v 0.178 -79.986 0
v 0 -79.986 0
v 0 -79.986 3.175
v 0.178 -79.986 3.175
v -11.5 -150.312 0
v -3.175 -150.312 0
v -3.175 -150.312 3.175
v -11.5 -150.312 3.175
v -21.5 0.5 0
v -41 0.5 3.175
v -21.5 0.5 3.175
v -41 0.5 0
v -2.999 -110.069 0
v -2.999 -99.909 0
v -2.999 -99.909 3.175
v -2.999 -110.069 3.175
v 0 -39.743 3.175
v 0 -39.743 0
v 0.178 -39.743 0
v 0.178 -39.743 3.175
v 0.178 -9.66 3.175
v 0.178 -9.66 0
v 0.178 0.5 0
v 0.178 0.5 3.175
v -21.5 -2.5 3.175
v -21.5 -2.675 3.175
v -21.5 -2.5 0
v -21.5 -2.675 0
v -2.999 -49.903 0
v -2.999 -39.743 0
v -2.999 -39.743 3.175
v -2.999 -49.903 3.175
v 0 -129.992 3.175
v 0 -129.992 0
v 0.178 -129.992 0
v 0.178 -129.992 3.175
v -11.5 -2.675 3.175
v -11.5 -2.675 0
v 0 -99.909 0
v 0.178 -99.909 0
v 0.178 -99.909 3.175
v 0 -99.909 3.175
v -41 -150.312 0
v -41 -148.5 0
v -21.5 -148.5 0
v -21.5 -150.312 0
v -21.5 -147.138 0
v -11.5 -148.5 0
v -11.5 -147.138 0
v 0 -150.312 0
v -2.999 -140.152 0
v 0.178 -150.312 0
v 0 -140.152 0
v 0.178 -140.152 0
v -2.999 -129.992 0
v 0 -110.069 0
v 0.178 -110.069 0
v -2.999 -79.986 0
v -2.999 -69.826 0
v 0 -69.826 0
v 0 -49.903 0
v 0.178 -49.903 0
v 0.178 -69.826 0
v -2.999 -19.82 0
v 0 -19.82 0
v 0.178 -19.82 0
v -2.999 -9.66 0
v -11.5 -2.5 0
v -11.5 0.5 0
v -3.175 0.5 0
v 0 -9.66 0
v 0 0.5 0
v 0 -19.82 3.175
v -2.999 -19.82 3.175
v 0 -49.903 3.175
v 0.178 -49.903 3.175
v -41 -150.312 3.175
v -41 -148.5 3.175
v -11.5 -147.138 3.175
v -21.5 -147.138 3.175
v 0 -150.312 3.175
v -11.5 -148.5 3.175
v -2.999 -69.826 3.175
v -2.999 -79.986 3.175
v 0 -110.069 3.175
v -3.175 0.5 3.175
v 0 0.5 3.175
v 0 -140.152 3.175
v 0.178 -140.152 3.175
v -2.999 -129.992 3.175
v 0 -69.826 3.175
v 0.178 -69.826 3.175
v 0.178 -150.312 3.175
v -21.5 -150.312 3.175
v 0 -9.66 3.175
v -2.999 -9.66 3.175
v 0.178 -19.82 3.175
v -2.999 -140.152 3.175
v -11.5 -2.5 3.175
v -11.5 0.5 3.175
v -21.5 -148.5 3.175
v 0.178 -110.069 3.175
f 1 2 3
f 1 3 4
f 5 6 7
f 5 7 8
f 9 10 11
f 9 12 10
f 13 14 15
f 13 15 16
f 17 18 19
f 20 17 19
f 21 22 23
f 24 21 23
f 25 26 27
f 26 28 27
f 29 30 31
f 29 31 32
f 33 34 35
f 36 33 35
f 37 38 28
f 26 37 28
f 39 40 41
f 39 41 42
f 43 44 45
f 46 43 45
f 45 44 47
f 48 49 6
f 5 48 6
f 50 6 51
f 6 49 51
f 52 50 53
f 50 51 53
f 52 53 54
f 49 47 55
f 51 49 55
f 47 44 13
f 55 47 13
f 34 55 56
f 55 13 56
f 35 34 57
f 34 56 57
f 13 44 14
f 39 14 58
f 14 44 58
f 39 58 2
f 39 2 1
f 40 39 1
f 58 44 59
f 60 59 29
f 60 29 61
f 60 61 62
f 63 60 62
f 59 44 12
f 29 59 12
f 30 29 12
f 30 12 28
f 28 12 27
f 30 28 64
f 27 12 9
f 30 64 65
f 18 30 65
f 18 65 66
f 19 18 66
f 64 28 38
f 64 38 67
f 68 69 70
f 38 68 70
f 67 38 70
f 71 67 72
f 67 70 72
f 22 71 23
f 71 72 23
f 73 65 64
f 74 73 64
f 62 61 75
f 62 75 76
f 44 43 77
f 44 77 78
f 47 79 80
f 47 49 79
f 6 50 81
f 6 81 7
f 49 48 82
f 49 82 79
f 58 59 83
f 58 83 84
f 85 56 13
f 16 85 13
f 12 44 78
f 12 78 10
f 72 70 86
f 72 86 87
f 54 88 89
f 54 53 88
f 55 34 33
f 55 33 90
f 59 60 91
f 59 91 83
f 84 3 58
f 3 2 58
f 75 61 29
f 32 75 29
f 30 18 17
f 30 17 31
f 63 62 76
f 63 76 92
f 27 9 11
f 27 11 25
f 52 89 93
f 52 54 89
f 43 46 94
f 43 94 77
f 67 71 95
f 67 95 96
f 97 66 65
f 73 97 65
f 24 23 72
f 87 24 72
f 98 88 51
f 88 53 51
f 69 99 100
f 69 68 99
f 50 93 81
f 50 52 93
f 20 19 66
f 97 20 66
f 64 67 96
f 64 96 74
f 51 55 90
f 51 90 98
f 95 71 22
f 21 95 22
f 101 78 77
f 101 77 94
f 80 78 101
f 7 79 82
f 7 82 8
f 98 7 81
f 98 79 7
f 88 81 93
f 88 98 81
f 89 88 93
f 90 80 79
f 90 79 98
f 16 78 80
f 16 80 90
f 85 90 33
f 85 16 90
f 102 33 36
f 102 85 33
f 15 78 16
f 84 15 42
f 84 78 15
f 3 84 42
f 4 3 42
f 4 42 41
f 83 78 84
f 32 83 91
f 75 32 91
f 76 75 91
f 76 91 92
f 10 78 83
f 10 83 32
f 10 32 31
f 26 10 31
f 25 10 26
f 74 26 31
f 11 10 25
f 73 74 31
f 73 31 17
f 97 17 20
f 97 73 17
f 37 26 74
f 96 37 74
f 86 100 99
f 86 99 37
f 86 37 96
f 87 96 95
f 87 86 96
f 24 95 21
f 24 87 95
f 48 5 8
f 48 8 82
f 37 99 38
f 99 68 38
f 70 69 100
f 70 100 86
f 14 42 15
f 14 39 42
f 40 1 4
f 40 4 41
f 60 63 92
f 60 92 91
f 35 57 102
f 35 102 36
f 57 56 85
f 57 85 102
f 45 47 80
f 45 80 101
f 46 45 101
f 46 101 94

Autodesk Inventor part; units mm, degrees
ref_plane "YZ Plane" through (0, 0, 0) normal (1, 0, 0) x (0, 1, 0)
ref_plane "XZ Plane" through (0, 0, 0) normal (0, 1, 0) x (-1, 0, 0)
ref_plane "XY Plane" through (0, 0, 0) normal (0, 0, 1) x (1, 0, 0)
sketch "Sketch1" plane through (0, 0, 0) normal (0, 0, 1) x (1, 0, 0)
  line L0 (-11.5, -148.5) -> (-11.5, -147.1375)
  line L1 (-21.5, -147.1375) -> (-21.5, -148.5)
  line L2 (-41, -148.5) -> (-41, 0.5)
  line L3 (-41, 0.5) -> (-21.5, 0.5)
  line L4 (-21.5, 0.5) -> (-21.5, -2.5)
  line L5 (-11.5, -2.5) -> (-11.5, 0.5)
  line L6 (-11.5, 0.5) -> (0, 0.5)
  line L7 (-11.5, -148.5) -> (-11.5, -147.1375)
  line L8 (-21.5, -147.1375) -> (-21.5, -148.5)
  line L9 (-41, -148.5) -> (-41, 0.5)
  line L10 (-41, 0.5) -> (-21.5, 0.5)
  line L11 (-21.5, 0.5) -> (-21.5, -2.5)
  line L12 (-11.5, -2.5) -> (-11.5, 0.5)
  line L13 (-11.5, 0.5) -> (0, 0.5)
  line L14 (-41, -150.3125) -> (-41, 0.5)
  line L15 (-11.5, -150.3125) -> (-11.5, -147.1375)
  line L16 (-11.5, -147.1375) -> (-21.5, -147.1375)
  line L17 (-21.5, -147.1375) -> (-21.5, -150.3125)
  line L18 (0, -150.3125) -> (-11.5, -150.3125)
  line L19 (-21.5, -150.3125) -> (-41, -150.3125)
  line L20 (-11.5, 0.5) -> (-11.5, -2.675)
  line L21 (-11.5, -2.675) -> (-21.5, -2.675)
  line L22 (-21.5, -2.675) -> (-21.5, 0.5)
  line L23 (0, 0.5) -> (-3.175, 0.5)
  line L24 (-3.175, -150.3125) -> (0, -150.3125)
  line L25 (-3.175, 0.5) -> (0, 0.5)
  line L26 (0, -9.66) -> (-2.9986, -9.66)
  line L27 (-2.9986, -9.66) -> (0, -9.66)
  line L28 (0, -19.82) -> (-2.9986, -19.82)
  line L29 (-2.9986, -19.82) -> (0, -19.82)
  line L30 (0, -39.7431) -> (-2.9986, -39.7431)
  line L31 (-2.9986, -39.7431) -> (0, -39.7431)
  line L32 (0, -49.9031) -> (-2.9986, -49.9031)
  line L33 (-2.9986, -49.9031) -> (0, -49.9031)
  line L34 (0, -69.8263) -> (-2.9986, -69.8263)
  line L35 (-2.9986, -69.8263) -> (0, -69.8263)
  line L36 (0, -79.9863) -> (-2.9986, -79.9863)
  line L37 (-2.9986, -79.9863) -> (0, -79.9863)
  line L38 (0, -99.9094) -> (-2.9986, -99.9094)
  line L39 (-2.9986, -99.9094) -> (0, -99.9094)
  line L40 (0, -110.0694) -> (-2.9986, -110.0694)
  line L41 (-2.9986, -110.0694) -> (0, -110.0694)
  line L42 (0, -129.9925) -> (-2.9986, -129.9925)
  line L43 (-2.9986, -129.9925) -> (0, -129.9925)
  line L44 (0, -140.1525) -> (-2.9986, -140.1525)
  line L45 (-2.9986, -140.1525) -> (0, -140.1525)
  line L46 (0, -150.3125) -> (-3.175, -150.3125)
  line L47 (-41, 0.5) -> (-21.5, 0.5)
  line L48 (-11.5, 0.5) -> (0, 0.5)
  line L49 (-2.9986, -9.66) -> (-2.9986, -19.82)
  line L50 (-2.9986, -39.7431) -> (-2.9986, -49.9031)
  line L51 (0, -49.9031) -> (0.1778, -49.9031)
  line L52 (0.1778, -49.9031) -> (0.1778, -69.8263)
  line L53 (0.1778, -69.8263) -> (0, -69.8263)
  line L54 (-2.9986, -69.8263) -> (-2.9986, -79.9863)
  line L55 (0, -79.9863) -> (0.1778, -79.9863)
  line L56 (0.1778, -79.9863) -> (0.1778, -99.9094)
  line L57 (0.1778, -99.9094) -> (0, -99.9094)
  line L58 (-2.9986, -99.9094) -> (-2.9986, -110.0694)
  line L59 (-2.9986, -129.9925) -> (-2.9986, -140.1525)
  line L60 (0.1778, -150.3125) -> (0, -150.3125)
  line L61 (0, -140.1525) -> (0.1778, -140.1525)
  line L62 (0, -129.9925) -> (0.1778, -129.9925)
  line L63 (0, -110.0694) -> (0.1778, -110.0694)
  line L64 (0.1778, -110.0694) -> (0.1778, -129.9925)
  line L65 (0.1778, -140.1525) -> (0.1778, -150.3125)
  line L66 (0, -39.7431) -> (0.1778, -39.7431)
  line L67 (0.1778, -39.7431) -> (0.1778, -19.82)
  line L68 (0.1778, -19.82) -> (0, -19.82)
  line L69 (0, -9.66) -> (0.1778, -9.66)
  line L70 (0.1778, -9.66) -> (0.1778, 0.5)
  line L71 (0.1778, 0.5) -> (0, 0.5)
  point P0 (0, 0)
  dimension "d2" = 3.175
  dimension "d4" = 10.16
  dimension "d5" = 10.16
  dimension "d6" = 19.9231
  dimension "d7" = 10.16
  dimension "d8" = 19.9231
  dimension "d9" = 10.16
  dimension "d10" = 19.9231
  dimension "d13" = 10.16
extrude "Extrusion2" add sketch "Sketch1" along normal blind 3.175
properties part number "1-8inch_Bottom2_1-Part"
